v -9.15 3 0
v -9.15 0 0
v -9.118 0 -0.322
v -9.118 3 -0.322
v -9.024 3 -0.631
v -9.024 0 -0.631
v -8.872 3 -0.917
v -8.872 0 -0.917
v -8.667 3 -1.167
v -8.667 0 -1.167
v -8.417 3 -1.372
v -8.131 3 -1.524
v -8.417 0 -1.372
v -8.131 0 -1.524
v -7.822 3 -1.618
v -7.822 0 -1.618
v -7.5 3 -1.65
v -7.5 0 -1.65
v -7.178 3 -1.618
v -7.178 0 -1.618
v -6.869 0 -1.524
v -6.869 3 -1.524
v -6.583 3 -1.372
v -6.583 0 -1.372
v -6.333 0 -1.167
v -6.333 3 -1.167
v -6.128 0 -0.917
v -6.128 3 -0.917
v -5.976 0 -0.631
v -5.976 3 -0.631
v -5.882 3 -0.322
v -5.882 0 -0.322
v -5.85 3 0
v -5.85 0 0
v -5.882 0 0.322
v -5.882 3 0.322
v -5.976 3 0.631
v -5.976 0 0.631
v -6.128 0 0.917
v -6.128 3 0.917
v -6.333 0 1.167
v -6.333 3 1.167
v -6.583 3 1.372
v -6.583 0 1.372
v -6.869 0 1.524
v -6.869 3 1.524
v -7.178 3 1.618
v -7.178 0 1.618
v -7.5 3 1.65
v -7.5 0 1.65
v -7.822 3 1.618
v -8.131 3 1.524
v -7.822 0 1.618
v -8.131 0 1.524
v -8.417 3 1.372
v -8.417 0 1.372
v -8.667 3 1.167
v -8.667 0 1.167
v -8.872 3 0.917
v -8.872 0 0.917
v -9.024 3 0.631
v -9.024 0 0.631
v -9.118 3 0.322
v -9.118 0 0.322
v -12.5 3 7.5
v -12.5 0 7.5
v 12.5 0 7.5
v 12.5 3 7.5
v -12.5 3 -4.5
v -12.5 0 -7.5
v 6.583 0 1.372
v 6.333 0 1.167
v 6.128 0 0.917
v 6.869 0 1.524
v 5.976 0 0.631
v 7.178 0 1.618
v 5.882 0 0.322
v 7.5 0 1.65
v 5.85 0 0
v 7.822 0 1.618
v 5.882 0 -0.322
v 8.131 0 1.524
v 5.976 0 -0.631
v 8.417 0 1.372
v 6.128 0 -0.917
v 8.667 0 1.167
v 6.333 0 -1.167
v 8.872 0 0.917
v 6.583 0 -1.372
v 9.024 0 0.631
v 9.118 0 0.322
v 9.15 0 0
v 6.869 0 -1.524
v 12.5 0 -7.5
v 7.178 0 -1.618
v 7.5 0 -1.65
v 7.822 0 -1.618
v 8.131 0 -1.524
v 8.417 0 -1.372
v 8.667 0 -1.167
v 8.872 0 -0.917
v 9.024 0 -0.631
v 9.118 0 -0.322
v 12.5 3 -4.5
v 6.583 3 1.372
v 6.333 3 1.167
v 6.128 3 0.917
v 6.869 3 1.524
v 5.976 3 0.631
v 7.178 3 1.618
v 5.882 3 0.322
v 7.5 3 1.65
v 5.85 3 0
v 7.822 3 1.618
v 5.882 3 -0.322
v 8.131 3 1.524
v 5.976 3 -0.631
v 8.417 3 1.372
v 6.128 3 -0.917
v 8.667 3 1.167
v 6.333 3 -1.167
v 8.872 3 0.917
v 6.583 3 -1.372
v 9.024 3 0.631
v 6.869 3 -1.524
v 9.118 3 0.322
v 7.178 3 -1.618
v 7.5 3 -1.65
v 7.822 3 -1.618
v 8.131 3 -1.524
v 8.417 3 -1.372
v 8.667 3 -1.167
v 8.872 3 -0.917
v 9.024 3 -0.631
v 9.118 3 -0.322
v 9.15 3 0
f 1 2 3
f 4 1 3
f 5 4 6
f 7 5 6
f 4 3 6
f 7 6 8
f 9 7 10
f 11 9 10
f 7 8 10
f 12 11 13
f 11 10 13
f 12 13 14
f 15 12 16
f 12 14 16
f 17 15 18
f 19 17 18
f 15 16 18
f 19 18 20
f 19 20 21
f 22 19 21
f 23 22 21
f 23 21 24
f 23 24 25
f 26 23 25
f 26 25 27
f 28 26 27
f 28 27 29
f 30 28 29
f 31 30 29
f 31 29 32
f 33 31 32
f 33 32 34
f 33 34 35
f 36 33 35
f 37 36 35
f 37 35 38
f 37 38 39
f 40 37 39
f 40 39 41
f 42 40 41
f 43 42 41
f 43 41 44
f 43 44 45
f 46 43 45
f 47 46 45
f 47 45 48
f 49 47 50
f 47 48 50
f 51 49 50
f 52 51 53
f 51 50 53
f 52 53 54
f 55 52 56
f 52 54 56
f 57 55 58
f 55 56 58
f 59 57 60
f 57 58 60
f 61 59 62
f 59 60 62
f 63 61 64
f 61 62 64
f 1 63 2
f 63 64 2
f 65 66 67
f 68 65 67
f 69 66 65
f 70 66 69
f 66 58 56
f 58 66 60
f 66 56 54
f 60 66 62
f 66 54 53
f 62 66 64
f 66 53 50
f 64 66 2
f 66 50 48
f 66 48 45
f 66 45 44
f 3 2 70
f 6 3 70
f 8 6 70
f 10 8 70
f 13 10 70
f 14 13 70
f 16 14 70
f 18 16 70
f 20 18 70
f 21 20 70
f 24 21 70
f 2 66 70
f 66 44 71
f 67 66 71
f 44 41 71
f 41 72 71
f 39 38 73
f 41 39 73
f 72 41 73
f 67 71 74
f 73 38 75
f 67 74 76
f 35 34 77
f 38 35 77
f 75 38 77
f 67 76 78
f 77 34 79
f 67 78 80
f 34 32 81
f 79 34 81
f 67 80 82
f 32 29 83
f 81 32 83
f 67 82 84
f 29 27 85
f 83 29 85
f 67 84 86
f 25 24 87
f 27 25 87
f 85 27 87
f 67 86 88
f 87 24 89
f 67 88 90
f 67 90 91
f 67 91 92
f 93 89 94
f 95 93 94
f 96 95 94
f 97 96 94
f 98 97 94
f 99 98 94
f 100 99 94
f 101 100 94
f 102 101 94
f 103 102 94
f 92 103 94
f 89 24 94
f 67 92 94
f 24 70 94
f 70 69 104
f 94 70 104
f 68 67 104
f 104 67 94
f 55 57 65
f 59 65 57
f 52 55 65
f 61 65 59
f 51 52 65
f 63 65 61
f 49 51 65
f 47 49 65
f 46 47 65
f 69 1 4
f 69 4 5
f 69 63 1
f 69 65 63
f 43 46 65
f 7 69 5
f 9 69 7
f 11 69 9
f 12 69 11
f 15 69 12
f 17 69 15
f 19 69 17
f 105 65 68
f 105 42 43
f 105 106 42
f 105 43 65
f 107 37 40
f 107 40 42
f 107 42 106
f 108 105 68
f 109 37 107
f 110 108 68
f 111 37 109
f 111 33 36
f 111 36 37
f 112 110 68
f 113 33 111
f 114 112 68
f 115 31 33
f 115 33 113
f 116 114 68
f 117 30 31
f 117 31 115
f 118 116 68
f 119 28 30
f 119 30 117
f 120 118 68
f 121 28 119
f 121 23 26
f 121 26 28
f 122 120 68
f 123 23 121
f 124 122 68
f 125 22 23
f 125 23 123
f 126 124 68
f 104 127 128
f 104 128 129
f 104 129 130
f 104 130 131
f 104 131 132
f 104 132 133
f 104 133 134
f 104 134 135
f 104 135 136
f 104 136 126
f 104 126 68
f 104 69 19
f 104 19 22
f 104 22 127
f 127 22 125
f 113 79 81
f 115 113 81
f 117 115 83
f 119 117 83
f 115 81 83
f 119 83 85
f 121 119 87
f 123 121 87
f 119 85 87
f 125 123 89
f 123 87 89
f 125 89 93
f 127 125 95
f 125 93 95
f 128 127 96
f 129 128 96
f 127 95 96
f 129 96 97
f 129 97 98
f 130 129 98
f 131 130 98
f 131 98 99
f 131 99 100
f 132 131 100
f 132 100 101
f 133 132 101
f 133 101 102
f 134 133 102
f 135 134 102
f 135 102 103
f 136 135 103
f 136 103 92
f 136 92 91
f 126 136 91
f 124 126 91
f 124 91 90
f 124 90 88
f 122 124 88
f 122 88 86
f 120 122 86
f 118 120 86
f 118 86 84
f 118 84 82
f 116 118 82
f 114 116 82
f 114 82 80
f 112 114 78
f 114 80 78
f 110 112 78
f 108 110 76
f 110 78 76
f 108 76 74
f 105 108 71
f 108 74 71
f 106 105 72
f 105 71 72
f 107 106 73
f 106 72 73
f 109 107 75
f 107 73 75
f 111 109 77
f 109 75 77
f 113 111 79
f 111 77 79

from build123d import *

# Parameters (mm, degrees)
SKETCH1_W             = 25
SKETCH1_H             = 15
BOSS_EXTRUDE1_DEPTH   = 3
M4X0_7_TAPPED_HOLE1_D = 3.3
CHAMFER1_SIZE         = 3


with BuildPart() as part:
    # Sketch1 → Boss-Extrude1 (new body)
    with BuildSketch(Plane(origin=(0, 0, 0), x_dir=(1, 0, 0), z_dir=(0, 1, 0))):
        Rectangle(SKETCH1_W, SKETCH1_H)
    extrude(amount=BOSS_EXTRUDE1_DEPTH)

    # M4x0.7 Tapped Hole1 (through all)
    with Locations(Plane(origin=(0, 3, 0), x_dir=(1, 0, 0), z_dir=(0, 1, 0))):
        with Locations((-7.5, 0), (7.5, 0)):
            Hole(M4X0_7_TAPPED_HOLE1_D / 2)

    # Chamfer1
    chamfer1_edges = [part.edges().sort_by_distance(p)[0] for p in [
        (0, 3, -7.5),
    ]]
    chamfer(chamfer1_edges, length=CHAMFER1_SIZE - 0.0001)  # a hair under: the kernel refuses the full size


solid = part.part
